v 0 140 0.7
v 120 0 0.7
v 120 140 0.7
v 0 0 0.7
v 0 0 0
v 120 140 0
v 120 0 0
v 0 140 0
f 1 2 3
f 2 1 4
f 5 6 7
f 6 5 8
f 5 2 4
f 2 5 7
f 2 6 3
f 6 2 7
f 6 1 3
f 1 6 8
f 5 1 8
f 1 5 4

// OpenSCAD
//Box width
bw=120;
//Box depth
bd=140;

///Height Layer 1
h=0.3+0.2+0.2;

cube([bw,bd,h]);
